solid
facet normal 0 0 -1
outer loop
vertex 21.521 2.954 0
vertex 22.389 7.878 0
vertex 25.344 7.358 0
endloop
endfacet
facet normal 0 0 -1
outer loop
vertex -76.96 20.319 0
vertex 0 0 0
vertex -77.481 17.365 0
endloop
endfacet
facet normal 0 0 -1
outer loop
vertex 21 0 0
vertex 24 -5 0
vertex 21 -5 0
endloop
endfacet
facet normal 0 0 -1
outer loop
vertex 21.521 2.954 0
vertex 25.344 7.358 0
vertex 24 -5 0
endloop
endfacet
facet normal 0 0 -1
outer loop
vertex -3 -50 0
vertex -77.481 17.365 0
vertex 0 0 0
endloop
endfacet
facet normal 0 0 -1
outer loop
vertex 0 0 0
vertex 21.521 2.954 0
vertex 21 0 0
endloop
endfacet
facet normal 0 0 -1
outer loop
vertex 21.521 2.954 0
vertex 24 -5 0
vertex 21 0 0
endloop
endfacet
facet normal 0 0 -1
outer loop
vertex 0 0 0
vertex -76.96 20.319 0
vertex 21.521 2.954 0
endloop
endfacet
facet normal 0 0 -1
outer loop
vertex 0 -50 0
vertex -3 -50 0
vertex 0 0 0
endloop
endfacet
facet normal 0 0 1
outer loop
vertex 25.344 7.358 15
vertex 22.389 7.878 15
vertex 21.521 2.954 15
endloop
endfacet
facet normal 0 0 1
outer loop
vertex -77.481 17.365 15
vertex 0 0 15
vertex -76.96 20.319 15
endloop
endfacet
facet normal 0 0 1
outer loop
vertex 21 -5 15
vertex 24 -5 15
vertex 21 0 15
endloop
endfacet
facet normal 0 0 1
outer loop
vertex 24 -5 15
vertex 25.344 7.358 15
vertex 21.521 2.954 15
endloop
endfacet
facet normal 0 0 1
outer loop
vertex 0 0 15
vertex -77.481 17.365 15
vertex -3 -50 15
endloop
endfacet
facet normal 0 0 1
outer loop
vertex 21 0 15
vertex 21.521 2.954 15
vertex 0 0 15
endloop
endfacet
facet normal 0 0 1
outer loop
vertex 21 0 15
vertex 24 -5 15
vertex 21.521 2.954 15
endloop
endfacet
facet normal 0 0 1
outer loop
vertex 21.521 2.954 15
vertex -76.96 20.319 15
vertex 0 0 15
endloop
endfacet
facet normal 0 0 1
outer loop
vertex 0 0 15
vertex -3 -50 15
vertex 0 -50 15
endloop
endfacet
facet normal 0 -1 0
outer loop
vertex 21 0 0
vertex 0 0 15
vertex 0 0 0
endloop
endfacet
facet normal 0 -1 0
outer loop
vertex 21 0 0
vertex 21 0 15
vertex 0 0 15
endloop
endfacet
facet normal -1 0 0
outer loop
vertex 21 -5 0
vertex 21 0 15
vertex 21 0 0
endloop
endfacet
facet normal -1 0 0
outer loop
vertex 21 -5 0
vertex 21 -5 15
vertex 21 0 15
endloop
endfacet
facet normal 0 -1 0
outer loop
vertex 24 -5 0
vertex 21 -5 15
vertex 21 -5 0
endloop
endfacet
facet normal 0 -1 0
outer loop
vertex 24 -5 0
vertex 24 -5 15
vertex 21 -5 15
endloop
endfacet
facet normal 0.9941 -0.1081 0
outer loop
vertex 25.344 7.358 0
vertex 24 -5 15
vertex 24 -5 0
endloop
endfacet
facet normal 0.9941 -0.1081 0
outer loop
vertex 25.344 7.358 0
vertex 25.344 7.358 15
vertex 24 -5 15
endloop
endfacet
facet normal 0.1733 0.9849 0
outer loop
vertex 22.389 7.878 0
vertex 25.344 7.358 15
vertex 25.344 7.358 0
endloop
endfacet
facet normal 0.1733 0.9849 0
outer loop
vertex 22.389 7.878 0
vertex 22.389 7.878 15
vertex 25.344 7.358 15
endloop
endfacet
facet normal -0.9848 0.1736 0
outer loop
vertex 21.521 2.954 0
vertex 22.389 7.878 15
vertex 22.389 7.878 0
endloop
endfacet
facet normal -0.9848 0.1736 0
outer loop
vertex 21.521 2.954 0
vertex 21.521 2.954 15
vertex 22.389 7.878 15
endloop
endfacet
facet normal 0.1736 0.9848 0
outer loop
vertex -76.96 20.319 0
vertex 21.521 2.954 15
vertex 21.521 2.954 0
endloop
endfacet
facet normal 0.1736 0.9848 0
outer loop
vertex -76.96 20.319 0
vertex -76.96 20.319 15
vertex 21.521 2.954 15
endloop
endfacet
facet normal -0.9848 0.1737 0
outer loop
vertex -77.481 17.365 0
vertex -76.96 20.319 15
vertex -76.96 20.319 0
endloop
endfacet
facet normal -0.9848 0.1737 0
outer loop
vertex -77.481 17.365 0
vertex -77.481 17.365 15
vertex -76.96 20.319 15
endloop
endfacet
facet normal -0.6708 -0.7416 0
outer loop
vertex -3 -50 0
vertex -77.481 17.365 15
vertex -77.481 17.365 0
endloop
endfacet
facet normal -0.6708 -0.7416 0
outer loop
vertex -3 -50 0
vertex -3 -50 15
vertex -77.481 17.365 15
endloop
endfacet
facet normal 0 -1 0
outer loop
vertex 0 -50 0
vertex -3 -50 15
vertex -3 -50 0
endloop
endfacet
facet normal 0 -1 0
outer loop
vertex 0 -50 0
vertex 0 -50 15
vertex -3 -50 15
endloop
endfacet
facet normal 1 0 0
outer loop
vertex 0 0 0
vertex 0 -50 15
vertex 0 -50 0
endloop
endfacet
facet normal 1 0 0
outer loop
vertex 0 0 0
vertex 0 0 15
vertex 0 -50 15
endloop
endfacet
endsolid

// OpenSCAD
angle = -10;
dispD = 21;
frontH = 5;
rearH = 50;
thick = 3;

linear_extrude(15) {
    polygon([[-thick, -rearH],
             [0, -rearH],
             [0, 0],
             [dispD, 0],
             [dispD, -frontH],
             [dispD + thick, -frontH],
             angled(dispD + thick, thick + 5),
             angled(dispD, thick + 5),
             angled(dispD, thick),
             angled(dispD - 100, thick),
             angled(dispD - 100, 0)]);
}

function angled(x, y) = [
    dispD + (x - dispD) * cos(angle) - y * sin(angle),
    (x - dispD) * sin(angle) + y * cos(angle)];
